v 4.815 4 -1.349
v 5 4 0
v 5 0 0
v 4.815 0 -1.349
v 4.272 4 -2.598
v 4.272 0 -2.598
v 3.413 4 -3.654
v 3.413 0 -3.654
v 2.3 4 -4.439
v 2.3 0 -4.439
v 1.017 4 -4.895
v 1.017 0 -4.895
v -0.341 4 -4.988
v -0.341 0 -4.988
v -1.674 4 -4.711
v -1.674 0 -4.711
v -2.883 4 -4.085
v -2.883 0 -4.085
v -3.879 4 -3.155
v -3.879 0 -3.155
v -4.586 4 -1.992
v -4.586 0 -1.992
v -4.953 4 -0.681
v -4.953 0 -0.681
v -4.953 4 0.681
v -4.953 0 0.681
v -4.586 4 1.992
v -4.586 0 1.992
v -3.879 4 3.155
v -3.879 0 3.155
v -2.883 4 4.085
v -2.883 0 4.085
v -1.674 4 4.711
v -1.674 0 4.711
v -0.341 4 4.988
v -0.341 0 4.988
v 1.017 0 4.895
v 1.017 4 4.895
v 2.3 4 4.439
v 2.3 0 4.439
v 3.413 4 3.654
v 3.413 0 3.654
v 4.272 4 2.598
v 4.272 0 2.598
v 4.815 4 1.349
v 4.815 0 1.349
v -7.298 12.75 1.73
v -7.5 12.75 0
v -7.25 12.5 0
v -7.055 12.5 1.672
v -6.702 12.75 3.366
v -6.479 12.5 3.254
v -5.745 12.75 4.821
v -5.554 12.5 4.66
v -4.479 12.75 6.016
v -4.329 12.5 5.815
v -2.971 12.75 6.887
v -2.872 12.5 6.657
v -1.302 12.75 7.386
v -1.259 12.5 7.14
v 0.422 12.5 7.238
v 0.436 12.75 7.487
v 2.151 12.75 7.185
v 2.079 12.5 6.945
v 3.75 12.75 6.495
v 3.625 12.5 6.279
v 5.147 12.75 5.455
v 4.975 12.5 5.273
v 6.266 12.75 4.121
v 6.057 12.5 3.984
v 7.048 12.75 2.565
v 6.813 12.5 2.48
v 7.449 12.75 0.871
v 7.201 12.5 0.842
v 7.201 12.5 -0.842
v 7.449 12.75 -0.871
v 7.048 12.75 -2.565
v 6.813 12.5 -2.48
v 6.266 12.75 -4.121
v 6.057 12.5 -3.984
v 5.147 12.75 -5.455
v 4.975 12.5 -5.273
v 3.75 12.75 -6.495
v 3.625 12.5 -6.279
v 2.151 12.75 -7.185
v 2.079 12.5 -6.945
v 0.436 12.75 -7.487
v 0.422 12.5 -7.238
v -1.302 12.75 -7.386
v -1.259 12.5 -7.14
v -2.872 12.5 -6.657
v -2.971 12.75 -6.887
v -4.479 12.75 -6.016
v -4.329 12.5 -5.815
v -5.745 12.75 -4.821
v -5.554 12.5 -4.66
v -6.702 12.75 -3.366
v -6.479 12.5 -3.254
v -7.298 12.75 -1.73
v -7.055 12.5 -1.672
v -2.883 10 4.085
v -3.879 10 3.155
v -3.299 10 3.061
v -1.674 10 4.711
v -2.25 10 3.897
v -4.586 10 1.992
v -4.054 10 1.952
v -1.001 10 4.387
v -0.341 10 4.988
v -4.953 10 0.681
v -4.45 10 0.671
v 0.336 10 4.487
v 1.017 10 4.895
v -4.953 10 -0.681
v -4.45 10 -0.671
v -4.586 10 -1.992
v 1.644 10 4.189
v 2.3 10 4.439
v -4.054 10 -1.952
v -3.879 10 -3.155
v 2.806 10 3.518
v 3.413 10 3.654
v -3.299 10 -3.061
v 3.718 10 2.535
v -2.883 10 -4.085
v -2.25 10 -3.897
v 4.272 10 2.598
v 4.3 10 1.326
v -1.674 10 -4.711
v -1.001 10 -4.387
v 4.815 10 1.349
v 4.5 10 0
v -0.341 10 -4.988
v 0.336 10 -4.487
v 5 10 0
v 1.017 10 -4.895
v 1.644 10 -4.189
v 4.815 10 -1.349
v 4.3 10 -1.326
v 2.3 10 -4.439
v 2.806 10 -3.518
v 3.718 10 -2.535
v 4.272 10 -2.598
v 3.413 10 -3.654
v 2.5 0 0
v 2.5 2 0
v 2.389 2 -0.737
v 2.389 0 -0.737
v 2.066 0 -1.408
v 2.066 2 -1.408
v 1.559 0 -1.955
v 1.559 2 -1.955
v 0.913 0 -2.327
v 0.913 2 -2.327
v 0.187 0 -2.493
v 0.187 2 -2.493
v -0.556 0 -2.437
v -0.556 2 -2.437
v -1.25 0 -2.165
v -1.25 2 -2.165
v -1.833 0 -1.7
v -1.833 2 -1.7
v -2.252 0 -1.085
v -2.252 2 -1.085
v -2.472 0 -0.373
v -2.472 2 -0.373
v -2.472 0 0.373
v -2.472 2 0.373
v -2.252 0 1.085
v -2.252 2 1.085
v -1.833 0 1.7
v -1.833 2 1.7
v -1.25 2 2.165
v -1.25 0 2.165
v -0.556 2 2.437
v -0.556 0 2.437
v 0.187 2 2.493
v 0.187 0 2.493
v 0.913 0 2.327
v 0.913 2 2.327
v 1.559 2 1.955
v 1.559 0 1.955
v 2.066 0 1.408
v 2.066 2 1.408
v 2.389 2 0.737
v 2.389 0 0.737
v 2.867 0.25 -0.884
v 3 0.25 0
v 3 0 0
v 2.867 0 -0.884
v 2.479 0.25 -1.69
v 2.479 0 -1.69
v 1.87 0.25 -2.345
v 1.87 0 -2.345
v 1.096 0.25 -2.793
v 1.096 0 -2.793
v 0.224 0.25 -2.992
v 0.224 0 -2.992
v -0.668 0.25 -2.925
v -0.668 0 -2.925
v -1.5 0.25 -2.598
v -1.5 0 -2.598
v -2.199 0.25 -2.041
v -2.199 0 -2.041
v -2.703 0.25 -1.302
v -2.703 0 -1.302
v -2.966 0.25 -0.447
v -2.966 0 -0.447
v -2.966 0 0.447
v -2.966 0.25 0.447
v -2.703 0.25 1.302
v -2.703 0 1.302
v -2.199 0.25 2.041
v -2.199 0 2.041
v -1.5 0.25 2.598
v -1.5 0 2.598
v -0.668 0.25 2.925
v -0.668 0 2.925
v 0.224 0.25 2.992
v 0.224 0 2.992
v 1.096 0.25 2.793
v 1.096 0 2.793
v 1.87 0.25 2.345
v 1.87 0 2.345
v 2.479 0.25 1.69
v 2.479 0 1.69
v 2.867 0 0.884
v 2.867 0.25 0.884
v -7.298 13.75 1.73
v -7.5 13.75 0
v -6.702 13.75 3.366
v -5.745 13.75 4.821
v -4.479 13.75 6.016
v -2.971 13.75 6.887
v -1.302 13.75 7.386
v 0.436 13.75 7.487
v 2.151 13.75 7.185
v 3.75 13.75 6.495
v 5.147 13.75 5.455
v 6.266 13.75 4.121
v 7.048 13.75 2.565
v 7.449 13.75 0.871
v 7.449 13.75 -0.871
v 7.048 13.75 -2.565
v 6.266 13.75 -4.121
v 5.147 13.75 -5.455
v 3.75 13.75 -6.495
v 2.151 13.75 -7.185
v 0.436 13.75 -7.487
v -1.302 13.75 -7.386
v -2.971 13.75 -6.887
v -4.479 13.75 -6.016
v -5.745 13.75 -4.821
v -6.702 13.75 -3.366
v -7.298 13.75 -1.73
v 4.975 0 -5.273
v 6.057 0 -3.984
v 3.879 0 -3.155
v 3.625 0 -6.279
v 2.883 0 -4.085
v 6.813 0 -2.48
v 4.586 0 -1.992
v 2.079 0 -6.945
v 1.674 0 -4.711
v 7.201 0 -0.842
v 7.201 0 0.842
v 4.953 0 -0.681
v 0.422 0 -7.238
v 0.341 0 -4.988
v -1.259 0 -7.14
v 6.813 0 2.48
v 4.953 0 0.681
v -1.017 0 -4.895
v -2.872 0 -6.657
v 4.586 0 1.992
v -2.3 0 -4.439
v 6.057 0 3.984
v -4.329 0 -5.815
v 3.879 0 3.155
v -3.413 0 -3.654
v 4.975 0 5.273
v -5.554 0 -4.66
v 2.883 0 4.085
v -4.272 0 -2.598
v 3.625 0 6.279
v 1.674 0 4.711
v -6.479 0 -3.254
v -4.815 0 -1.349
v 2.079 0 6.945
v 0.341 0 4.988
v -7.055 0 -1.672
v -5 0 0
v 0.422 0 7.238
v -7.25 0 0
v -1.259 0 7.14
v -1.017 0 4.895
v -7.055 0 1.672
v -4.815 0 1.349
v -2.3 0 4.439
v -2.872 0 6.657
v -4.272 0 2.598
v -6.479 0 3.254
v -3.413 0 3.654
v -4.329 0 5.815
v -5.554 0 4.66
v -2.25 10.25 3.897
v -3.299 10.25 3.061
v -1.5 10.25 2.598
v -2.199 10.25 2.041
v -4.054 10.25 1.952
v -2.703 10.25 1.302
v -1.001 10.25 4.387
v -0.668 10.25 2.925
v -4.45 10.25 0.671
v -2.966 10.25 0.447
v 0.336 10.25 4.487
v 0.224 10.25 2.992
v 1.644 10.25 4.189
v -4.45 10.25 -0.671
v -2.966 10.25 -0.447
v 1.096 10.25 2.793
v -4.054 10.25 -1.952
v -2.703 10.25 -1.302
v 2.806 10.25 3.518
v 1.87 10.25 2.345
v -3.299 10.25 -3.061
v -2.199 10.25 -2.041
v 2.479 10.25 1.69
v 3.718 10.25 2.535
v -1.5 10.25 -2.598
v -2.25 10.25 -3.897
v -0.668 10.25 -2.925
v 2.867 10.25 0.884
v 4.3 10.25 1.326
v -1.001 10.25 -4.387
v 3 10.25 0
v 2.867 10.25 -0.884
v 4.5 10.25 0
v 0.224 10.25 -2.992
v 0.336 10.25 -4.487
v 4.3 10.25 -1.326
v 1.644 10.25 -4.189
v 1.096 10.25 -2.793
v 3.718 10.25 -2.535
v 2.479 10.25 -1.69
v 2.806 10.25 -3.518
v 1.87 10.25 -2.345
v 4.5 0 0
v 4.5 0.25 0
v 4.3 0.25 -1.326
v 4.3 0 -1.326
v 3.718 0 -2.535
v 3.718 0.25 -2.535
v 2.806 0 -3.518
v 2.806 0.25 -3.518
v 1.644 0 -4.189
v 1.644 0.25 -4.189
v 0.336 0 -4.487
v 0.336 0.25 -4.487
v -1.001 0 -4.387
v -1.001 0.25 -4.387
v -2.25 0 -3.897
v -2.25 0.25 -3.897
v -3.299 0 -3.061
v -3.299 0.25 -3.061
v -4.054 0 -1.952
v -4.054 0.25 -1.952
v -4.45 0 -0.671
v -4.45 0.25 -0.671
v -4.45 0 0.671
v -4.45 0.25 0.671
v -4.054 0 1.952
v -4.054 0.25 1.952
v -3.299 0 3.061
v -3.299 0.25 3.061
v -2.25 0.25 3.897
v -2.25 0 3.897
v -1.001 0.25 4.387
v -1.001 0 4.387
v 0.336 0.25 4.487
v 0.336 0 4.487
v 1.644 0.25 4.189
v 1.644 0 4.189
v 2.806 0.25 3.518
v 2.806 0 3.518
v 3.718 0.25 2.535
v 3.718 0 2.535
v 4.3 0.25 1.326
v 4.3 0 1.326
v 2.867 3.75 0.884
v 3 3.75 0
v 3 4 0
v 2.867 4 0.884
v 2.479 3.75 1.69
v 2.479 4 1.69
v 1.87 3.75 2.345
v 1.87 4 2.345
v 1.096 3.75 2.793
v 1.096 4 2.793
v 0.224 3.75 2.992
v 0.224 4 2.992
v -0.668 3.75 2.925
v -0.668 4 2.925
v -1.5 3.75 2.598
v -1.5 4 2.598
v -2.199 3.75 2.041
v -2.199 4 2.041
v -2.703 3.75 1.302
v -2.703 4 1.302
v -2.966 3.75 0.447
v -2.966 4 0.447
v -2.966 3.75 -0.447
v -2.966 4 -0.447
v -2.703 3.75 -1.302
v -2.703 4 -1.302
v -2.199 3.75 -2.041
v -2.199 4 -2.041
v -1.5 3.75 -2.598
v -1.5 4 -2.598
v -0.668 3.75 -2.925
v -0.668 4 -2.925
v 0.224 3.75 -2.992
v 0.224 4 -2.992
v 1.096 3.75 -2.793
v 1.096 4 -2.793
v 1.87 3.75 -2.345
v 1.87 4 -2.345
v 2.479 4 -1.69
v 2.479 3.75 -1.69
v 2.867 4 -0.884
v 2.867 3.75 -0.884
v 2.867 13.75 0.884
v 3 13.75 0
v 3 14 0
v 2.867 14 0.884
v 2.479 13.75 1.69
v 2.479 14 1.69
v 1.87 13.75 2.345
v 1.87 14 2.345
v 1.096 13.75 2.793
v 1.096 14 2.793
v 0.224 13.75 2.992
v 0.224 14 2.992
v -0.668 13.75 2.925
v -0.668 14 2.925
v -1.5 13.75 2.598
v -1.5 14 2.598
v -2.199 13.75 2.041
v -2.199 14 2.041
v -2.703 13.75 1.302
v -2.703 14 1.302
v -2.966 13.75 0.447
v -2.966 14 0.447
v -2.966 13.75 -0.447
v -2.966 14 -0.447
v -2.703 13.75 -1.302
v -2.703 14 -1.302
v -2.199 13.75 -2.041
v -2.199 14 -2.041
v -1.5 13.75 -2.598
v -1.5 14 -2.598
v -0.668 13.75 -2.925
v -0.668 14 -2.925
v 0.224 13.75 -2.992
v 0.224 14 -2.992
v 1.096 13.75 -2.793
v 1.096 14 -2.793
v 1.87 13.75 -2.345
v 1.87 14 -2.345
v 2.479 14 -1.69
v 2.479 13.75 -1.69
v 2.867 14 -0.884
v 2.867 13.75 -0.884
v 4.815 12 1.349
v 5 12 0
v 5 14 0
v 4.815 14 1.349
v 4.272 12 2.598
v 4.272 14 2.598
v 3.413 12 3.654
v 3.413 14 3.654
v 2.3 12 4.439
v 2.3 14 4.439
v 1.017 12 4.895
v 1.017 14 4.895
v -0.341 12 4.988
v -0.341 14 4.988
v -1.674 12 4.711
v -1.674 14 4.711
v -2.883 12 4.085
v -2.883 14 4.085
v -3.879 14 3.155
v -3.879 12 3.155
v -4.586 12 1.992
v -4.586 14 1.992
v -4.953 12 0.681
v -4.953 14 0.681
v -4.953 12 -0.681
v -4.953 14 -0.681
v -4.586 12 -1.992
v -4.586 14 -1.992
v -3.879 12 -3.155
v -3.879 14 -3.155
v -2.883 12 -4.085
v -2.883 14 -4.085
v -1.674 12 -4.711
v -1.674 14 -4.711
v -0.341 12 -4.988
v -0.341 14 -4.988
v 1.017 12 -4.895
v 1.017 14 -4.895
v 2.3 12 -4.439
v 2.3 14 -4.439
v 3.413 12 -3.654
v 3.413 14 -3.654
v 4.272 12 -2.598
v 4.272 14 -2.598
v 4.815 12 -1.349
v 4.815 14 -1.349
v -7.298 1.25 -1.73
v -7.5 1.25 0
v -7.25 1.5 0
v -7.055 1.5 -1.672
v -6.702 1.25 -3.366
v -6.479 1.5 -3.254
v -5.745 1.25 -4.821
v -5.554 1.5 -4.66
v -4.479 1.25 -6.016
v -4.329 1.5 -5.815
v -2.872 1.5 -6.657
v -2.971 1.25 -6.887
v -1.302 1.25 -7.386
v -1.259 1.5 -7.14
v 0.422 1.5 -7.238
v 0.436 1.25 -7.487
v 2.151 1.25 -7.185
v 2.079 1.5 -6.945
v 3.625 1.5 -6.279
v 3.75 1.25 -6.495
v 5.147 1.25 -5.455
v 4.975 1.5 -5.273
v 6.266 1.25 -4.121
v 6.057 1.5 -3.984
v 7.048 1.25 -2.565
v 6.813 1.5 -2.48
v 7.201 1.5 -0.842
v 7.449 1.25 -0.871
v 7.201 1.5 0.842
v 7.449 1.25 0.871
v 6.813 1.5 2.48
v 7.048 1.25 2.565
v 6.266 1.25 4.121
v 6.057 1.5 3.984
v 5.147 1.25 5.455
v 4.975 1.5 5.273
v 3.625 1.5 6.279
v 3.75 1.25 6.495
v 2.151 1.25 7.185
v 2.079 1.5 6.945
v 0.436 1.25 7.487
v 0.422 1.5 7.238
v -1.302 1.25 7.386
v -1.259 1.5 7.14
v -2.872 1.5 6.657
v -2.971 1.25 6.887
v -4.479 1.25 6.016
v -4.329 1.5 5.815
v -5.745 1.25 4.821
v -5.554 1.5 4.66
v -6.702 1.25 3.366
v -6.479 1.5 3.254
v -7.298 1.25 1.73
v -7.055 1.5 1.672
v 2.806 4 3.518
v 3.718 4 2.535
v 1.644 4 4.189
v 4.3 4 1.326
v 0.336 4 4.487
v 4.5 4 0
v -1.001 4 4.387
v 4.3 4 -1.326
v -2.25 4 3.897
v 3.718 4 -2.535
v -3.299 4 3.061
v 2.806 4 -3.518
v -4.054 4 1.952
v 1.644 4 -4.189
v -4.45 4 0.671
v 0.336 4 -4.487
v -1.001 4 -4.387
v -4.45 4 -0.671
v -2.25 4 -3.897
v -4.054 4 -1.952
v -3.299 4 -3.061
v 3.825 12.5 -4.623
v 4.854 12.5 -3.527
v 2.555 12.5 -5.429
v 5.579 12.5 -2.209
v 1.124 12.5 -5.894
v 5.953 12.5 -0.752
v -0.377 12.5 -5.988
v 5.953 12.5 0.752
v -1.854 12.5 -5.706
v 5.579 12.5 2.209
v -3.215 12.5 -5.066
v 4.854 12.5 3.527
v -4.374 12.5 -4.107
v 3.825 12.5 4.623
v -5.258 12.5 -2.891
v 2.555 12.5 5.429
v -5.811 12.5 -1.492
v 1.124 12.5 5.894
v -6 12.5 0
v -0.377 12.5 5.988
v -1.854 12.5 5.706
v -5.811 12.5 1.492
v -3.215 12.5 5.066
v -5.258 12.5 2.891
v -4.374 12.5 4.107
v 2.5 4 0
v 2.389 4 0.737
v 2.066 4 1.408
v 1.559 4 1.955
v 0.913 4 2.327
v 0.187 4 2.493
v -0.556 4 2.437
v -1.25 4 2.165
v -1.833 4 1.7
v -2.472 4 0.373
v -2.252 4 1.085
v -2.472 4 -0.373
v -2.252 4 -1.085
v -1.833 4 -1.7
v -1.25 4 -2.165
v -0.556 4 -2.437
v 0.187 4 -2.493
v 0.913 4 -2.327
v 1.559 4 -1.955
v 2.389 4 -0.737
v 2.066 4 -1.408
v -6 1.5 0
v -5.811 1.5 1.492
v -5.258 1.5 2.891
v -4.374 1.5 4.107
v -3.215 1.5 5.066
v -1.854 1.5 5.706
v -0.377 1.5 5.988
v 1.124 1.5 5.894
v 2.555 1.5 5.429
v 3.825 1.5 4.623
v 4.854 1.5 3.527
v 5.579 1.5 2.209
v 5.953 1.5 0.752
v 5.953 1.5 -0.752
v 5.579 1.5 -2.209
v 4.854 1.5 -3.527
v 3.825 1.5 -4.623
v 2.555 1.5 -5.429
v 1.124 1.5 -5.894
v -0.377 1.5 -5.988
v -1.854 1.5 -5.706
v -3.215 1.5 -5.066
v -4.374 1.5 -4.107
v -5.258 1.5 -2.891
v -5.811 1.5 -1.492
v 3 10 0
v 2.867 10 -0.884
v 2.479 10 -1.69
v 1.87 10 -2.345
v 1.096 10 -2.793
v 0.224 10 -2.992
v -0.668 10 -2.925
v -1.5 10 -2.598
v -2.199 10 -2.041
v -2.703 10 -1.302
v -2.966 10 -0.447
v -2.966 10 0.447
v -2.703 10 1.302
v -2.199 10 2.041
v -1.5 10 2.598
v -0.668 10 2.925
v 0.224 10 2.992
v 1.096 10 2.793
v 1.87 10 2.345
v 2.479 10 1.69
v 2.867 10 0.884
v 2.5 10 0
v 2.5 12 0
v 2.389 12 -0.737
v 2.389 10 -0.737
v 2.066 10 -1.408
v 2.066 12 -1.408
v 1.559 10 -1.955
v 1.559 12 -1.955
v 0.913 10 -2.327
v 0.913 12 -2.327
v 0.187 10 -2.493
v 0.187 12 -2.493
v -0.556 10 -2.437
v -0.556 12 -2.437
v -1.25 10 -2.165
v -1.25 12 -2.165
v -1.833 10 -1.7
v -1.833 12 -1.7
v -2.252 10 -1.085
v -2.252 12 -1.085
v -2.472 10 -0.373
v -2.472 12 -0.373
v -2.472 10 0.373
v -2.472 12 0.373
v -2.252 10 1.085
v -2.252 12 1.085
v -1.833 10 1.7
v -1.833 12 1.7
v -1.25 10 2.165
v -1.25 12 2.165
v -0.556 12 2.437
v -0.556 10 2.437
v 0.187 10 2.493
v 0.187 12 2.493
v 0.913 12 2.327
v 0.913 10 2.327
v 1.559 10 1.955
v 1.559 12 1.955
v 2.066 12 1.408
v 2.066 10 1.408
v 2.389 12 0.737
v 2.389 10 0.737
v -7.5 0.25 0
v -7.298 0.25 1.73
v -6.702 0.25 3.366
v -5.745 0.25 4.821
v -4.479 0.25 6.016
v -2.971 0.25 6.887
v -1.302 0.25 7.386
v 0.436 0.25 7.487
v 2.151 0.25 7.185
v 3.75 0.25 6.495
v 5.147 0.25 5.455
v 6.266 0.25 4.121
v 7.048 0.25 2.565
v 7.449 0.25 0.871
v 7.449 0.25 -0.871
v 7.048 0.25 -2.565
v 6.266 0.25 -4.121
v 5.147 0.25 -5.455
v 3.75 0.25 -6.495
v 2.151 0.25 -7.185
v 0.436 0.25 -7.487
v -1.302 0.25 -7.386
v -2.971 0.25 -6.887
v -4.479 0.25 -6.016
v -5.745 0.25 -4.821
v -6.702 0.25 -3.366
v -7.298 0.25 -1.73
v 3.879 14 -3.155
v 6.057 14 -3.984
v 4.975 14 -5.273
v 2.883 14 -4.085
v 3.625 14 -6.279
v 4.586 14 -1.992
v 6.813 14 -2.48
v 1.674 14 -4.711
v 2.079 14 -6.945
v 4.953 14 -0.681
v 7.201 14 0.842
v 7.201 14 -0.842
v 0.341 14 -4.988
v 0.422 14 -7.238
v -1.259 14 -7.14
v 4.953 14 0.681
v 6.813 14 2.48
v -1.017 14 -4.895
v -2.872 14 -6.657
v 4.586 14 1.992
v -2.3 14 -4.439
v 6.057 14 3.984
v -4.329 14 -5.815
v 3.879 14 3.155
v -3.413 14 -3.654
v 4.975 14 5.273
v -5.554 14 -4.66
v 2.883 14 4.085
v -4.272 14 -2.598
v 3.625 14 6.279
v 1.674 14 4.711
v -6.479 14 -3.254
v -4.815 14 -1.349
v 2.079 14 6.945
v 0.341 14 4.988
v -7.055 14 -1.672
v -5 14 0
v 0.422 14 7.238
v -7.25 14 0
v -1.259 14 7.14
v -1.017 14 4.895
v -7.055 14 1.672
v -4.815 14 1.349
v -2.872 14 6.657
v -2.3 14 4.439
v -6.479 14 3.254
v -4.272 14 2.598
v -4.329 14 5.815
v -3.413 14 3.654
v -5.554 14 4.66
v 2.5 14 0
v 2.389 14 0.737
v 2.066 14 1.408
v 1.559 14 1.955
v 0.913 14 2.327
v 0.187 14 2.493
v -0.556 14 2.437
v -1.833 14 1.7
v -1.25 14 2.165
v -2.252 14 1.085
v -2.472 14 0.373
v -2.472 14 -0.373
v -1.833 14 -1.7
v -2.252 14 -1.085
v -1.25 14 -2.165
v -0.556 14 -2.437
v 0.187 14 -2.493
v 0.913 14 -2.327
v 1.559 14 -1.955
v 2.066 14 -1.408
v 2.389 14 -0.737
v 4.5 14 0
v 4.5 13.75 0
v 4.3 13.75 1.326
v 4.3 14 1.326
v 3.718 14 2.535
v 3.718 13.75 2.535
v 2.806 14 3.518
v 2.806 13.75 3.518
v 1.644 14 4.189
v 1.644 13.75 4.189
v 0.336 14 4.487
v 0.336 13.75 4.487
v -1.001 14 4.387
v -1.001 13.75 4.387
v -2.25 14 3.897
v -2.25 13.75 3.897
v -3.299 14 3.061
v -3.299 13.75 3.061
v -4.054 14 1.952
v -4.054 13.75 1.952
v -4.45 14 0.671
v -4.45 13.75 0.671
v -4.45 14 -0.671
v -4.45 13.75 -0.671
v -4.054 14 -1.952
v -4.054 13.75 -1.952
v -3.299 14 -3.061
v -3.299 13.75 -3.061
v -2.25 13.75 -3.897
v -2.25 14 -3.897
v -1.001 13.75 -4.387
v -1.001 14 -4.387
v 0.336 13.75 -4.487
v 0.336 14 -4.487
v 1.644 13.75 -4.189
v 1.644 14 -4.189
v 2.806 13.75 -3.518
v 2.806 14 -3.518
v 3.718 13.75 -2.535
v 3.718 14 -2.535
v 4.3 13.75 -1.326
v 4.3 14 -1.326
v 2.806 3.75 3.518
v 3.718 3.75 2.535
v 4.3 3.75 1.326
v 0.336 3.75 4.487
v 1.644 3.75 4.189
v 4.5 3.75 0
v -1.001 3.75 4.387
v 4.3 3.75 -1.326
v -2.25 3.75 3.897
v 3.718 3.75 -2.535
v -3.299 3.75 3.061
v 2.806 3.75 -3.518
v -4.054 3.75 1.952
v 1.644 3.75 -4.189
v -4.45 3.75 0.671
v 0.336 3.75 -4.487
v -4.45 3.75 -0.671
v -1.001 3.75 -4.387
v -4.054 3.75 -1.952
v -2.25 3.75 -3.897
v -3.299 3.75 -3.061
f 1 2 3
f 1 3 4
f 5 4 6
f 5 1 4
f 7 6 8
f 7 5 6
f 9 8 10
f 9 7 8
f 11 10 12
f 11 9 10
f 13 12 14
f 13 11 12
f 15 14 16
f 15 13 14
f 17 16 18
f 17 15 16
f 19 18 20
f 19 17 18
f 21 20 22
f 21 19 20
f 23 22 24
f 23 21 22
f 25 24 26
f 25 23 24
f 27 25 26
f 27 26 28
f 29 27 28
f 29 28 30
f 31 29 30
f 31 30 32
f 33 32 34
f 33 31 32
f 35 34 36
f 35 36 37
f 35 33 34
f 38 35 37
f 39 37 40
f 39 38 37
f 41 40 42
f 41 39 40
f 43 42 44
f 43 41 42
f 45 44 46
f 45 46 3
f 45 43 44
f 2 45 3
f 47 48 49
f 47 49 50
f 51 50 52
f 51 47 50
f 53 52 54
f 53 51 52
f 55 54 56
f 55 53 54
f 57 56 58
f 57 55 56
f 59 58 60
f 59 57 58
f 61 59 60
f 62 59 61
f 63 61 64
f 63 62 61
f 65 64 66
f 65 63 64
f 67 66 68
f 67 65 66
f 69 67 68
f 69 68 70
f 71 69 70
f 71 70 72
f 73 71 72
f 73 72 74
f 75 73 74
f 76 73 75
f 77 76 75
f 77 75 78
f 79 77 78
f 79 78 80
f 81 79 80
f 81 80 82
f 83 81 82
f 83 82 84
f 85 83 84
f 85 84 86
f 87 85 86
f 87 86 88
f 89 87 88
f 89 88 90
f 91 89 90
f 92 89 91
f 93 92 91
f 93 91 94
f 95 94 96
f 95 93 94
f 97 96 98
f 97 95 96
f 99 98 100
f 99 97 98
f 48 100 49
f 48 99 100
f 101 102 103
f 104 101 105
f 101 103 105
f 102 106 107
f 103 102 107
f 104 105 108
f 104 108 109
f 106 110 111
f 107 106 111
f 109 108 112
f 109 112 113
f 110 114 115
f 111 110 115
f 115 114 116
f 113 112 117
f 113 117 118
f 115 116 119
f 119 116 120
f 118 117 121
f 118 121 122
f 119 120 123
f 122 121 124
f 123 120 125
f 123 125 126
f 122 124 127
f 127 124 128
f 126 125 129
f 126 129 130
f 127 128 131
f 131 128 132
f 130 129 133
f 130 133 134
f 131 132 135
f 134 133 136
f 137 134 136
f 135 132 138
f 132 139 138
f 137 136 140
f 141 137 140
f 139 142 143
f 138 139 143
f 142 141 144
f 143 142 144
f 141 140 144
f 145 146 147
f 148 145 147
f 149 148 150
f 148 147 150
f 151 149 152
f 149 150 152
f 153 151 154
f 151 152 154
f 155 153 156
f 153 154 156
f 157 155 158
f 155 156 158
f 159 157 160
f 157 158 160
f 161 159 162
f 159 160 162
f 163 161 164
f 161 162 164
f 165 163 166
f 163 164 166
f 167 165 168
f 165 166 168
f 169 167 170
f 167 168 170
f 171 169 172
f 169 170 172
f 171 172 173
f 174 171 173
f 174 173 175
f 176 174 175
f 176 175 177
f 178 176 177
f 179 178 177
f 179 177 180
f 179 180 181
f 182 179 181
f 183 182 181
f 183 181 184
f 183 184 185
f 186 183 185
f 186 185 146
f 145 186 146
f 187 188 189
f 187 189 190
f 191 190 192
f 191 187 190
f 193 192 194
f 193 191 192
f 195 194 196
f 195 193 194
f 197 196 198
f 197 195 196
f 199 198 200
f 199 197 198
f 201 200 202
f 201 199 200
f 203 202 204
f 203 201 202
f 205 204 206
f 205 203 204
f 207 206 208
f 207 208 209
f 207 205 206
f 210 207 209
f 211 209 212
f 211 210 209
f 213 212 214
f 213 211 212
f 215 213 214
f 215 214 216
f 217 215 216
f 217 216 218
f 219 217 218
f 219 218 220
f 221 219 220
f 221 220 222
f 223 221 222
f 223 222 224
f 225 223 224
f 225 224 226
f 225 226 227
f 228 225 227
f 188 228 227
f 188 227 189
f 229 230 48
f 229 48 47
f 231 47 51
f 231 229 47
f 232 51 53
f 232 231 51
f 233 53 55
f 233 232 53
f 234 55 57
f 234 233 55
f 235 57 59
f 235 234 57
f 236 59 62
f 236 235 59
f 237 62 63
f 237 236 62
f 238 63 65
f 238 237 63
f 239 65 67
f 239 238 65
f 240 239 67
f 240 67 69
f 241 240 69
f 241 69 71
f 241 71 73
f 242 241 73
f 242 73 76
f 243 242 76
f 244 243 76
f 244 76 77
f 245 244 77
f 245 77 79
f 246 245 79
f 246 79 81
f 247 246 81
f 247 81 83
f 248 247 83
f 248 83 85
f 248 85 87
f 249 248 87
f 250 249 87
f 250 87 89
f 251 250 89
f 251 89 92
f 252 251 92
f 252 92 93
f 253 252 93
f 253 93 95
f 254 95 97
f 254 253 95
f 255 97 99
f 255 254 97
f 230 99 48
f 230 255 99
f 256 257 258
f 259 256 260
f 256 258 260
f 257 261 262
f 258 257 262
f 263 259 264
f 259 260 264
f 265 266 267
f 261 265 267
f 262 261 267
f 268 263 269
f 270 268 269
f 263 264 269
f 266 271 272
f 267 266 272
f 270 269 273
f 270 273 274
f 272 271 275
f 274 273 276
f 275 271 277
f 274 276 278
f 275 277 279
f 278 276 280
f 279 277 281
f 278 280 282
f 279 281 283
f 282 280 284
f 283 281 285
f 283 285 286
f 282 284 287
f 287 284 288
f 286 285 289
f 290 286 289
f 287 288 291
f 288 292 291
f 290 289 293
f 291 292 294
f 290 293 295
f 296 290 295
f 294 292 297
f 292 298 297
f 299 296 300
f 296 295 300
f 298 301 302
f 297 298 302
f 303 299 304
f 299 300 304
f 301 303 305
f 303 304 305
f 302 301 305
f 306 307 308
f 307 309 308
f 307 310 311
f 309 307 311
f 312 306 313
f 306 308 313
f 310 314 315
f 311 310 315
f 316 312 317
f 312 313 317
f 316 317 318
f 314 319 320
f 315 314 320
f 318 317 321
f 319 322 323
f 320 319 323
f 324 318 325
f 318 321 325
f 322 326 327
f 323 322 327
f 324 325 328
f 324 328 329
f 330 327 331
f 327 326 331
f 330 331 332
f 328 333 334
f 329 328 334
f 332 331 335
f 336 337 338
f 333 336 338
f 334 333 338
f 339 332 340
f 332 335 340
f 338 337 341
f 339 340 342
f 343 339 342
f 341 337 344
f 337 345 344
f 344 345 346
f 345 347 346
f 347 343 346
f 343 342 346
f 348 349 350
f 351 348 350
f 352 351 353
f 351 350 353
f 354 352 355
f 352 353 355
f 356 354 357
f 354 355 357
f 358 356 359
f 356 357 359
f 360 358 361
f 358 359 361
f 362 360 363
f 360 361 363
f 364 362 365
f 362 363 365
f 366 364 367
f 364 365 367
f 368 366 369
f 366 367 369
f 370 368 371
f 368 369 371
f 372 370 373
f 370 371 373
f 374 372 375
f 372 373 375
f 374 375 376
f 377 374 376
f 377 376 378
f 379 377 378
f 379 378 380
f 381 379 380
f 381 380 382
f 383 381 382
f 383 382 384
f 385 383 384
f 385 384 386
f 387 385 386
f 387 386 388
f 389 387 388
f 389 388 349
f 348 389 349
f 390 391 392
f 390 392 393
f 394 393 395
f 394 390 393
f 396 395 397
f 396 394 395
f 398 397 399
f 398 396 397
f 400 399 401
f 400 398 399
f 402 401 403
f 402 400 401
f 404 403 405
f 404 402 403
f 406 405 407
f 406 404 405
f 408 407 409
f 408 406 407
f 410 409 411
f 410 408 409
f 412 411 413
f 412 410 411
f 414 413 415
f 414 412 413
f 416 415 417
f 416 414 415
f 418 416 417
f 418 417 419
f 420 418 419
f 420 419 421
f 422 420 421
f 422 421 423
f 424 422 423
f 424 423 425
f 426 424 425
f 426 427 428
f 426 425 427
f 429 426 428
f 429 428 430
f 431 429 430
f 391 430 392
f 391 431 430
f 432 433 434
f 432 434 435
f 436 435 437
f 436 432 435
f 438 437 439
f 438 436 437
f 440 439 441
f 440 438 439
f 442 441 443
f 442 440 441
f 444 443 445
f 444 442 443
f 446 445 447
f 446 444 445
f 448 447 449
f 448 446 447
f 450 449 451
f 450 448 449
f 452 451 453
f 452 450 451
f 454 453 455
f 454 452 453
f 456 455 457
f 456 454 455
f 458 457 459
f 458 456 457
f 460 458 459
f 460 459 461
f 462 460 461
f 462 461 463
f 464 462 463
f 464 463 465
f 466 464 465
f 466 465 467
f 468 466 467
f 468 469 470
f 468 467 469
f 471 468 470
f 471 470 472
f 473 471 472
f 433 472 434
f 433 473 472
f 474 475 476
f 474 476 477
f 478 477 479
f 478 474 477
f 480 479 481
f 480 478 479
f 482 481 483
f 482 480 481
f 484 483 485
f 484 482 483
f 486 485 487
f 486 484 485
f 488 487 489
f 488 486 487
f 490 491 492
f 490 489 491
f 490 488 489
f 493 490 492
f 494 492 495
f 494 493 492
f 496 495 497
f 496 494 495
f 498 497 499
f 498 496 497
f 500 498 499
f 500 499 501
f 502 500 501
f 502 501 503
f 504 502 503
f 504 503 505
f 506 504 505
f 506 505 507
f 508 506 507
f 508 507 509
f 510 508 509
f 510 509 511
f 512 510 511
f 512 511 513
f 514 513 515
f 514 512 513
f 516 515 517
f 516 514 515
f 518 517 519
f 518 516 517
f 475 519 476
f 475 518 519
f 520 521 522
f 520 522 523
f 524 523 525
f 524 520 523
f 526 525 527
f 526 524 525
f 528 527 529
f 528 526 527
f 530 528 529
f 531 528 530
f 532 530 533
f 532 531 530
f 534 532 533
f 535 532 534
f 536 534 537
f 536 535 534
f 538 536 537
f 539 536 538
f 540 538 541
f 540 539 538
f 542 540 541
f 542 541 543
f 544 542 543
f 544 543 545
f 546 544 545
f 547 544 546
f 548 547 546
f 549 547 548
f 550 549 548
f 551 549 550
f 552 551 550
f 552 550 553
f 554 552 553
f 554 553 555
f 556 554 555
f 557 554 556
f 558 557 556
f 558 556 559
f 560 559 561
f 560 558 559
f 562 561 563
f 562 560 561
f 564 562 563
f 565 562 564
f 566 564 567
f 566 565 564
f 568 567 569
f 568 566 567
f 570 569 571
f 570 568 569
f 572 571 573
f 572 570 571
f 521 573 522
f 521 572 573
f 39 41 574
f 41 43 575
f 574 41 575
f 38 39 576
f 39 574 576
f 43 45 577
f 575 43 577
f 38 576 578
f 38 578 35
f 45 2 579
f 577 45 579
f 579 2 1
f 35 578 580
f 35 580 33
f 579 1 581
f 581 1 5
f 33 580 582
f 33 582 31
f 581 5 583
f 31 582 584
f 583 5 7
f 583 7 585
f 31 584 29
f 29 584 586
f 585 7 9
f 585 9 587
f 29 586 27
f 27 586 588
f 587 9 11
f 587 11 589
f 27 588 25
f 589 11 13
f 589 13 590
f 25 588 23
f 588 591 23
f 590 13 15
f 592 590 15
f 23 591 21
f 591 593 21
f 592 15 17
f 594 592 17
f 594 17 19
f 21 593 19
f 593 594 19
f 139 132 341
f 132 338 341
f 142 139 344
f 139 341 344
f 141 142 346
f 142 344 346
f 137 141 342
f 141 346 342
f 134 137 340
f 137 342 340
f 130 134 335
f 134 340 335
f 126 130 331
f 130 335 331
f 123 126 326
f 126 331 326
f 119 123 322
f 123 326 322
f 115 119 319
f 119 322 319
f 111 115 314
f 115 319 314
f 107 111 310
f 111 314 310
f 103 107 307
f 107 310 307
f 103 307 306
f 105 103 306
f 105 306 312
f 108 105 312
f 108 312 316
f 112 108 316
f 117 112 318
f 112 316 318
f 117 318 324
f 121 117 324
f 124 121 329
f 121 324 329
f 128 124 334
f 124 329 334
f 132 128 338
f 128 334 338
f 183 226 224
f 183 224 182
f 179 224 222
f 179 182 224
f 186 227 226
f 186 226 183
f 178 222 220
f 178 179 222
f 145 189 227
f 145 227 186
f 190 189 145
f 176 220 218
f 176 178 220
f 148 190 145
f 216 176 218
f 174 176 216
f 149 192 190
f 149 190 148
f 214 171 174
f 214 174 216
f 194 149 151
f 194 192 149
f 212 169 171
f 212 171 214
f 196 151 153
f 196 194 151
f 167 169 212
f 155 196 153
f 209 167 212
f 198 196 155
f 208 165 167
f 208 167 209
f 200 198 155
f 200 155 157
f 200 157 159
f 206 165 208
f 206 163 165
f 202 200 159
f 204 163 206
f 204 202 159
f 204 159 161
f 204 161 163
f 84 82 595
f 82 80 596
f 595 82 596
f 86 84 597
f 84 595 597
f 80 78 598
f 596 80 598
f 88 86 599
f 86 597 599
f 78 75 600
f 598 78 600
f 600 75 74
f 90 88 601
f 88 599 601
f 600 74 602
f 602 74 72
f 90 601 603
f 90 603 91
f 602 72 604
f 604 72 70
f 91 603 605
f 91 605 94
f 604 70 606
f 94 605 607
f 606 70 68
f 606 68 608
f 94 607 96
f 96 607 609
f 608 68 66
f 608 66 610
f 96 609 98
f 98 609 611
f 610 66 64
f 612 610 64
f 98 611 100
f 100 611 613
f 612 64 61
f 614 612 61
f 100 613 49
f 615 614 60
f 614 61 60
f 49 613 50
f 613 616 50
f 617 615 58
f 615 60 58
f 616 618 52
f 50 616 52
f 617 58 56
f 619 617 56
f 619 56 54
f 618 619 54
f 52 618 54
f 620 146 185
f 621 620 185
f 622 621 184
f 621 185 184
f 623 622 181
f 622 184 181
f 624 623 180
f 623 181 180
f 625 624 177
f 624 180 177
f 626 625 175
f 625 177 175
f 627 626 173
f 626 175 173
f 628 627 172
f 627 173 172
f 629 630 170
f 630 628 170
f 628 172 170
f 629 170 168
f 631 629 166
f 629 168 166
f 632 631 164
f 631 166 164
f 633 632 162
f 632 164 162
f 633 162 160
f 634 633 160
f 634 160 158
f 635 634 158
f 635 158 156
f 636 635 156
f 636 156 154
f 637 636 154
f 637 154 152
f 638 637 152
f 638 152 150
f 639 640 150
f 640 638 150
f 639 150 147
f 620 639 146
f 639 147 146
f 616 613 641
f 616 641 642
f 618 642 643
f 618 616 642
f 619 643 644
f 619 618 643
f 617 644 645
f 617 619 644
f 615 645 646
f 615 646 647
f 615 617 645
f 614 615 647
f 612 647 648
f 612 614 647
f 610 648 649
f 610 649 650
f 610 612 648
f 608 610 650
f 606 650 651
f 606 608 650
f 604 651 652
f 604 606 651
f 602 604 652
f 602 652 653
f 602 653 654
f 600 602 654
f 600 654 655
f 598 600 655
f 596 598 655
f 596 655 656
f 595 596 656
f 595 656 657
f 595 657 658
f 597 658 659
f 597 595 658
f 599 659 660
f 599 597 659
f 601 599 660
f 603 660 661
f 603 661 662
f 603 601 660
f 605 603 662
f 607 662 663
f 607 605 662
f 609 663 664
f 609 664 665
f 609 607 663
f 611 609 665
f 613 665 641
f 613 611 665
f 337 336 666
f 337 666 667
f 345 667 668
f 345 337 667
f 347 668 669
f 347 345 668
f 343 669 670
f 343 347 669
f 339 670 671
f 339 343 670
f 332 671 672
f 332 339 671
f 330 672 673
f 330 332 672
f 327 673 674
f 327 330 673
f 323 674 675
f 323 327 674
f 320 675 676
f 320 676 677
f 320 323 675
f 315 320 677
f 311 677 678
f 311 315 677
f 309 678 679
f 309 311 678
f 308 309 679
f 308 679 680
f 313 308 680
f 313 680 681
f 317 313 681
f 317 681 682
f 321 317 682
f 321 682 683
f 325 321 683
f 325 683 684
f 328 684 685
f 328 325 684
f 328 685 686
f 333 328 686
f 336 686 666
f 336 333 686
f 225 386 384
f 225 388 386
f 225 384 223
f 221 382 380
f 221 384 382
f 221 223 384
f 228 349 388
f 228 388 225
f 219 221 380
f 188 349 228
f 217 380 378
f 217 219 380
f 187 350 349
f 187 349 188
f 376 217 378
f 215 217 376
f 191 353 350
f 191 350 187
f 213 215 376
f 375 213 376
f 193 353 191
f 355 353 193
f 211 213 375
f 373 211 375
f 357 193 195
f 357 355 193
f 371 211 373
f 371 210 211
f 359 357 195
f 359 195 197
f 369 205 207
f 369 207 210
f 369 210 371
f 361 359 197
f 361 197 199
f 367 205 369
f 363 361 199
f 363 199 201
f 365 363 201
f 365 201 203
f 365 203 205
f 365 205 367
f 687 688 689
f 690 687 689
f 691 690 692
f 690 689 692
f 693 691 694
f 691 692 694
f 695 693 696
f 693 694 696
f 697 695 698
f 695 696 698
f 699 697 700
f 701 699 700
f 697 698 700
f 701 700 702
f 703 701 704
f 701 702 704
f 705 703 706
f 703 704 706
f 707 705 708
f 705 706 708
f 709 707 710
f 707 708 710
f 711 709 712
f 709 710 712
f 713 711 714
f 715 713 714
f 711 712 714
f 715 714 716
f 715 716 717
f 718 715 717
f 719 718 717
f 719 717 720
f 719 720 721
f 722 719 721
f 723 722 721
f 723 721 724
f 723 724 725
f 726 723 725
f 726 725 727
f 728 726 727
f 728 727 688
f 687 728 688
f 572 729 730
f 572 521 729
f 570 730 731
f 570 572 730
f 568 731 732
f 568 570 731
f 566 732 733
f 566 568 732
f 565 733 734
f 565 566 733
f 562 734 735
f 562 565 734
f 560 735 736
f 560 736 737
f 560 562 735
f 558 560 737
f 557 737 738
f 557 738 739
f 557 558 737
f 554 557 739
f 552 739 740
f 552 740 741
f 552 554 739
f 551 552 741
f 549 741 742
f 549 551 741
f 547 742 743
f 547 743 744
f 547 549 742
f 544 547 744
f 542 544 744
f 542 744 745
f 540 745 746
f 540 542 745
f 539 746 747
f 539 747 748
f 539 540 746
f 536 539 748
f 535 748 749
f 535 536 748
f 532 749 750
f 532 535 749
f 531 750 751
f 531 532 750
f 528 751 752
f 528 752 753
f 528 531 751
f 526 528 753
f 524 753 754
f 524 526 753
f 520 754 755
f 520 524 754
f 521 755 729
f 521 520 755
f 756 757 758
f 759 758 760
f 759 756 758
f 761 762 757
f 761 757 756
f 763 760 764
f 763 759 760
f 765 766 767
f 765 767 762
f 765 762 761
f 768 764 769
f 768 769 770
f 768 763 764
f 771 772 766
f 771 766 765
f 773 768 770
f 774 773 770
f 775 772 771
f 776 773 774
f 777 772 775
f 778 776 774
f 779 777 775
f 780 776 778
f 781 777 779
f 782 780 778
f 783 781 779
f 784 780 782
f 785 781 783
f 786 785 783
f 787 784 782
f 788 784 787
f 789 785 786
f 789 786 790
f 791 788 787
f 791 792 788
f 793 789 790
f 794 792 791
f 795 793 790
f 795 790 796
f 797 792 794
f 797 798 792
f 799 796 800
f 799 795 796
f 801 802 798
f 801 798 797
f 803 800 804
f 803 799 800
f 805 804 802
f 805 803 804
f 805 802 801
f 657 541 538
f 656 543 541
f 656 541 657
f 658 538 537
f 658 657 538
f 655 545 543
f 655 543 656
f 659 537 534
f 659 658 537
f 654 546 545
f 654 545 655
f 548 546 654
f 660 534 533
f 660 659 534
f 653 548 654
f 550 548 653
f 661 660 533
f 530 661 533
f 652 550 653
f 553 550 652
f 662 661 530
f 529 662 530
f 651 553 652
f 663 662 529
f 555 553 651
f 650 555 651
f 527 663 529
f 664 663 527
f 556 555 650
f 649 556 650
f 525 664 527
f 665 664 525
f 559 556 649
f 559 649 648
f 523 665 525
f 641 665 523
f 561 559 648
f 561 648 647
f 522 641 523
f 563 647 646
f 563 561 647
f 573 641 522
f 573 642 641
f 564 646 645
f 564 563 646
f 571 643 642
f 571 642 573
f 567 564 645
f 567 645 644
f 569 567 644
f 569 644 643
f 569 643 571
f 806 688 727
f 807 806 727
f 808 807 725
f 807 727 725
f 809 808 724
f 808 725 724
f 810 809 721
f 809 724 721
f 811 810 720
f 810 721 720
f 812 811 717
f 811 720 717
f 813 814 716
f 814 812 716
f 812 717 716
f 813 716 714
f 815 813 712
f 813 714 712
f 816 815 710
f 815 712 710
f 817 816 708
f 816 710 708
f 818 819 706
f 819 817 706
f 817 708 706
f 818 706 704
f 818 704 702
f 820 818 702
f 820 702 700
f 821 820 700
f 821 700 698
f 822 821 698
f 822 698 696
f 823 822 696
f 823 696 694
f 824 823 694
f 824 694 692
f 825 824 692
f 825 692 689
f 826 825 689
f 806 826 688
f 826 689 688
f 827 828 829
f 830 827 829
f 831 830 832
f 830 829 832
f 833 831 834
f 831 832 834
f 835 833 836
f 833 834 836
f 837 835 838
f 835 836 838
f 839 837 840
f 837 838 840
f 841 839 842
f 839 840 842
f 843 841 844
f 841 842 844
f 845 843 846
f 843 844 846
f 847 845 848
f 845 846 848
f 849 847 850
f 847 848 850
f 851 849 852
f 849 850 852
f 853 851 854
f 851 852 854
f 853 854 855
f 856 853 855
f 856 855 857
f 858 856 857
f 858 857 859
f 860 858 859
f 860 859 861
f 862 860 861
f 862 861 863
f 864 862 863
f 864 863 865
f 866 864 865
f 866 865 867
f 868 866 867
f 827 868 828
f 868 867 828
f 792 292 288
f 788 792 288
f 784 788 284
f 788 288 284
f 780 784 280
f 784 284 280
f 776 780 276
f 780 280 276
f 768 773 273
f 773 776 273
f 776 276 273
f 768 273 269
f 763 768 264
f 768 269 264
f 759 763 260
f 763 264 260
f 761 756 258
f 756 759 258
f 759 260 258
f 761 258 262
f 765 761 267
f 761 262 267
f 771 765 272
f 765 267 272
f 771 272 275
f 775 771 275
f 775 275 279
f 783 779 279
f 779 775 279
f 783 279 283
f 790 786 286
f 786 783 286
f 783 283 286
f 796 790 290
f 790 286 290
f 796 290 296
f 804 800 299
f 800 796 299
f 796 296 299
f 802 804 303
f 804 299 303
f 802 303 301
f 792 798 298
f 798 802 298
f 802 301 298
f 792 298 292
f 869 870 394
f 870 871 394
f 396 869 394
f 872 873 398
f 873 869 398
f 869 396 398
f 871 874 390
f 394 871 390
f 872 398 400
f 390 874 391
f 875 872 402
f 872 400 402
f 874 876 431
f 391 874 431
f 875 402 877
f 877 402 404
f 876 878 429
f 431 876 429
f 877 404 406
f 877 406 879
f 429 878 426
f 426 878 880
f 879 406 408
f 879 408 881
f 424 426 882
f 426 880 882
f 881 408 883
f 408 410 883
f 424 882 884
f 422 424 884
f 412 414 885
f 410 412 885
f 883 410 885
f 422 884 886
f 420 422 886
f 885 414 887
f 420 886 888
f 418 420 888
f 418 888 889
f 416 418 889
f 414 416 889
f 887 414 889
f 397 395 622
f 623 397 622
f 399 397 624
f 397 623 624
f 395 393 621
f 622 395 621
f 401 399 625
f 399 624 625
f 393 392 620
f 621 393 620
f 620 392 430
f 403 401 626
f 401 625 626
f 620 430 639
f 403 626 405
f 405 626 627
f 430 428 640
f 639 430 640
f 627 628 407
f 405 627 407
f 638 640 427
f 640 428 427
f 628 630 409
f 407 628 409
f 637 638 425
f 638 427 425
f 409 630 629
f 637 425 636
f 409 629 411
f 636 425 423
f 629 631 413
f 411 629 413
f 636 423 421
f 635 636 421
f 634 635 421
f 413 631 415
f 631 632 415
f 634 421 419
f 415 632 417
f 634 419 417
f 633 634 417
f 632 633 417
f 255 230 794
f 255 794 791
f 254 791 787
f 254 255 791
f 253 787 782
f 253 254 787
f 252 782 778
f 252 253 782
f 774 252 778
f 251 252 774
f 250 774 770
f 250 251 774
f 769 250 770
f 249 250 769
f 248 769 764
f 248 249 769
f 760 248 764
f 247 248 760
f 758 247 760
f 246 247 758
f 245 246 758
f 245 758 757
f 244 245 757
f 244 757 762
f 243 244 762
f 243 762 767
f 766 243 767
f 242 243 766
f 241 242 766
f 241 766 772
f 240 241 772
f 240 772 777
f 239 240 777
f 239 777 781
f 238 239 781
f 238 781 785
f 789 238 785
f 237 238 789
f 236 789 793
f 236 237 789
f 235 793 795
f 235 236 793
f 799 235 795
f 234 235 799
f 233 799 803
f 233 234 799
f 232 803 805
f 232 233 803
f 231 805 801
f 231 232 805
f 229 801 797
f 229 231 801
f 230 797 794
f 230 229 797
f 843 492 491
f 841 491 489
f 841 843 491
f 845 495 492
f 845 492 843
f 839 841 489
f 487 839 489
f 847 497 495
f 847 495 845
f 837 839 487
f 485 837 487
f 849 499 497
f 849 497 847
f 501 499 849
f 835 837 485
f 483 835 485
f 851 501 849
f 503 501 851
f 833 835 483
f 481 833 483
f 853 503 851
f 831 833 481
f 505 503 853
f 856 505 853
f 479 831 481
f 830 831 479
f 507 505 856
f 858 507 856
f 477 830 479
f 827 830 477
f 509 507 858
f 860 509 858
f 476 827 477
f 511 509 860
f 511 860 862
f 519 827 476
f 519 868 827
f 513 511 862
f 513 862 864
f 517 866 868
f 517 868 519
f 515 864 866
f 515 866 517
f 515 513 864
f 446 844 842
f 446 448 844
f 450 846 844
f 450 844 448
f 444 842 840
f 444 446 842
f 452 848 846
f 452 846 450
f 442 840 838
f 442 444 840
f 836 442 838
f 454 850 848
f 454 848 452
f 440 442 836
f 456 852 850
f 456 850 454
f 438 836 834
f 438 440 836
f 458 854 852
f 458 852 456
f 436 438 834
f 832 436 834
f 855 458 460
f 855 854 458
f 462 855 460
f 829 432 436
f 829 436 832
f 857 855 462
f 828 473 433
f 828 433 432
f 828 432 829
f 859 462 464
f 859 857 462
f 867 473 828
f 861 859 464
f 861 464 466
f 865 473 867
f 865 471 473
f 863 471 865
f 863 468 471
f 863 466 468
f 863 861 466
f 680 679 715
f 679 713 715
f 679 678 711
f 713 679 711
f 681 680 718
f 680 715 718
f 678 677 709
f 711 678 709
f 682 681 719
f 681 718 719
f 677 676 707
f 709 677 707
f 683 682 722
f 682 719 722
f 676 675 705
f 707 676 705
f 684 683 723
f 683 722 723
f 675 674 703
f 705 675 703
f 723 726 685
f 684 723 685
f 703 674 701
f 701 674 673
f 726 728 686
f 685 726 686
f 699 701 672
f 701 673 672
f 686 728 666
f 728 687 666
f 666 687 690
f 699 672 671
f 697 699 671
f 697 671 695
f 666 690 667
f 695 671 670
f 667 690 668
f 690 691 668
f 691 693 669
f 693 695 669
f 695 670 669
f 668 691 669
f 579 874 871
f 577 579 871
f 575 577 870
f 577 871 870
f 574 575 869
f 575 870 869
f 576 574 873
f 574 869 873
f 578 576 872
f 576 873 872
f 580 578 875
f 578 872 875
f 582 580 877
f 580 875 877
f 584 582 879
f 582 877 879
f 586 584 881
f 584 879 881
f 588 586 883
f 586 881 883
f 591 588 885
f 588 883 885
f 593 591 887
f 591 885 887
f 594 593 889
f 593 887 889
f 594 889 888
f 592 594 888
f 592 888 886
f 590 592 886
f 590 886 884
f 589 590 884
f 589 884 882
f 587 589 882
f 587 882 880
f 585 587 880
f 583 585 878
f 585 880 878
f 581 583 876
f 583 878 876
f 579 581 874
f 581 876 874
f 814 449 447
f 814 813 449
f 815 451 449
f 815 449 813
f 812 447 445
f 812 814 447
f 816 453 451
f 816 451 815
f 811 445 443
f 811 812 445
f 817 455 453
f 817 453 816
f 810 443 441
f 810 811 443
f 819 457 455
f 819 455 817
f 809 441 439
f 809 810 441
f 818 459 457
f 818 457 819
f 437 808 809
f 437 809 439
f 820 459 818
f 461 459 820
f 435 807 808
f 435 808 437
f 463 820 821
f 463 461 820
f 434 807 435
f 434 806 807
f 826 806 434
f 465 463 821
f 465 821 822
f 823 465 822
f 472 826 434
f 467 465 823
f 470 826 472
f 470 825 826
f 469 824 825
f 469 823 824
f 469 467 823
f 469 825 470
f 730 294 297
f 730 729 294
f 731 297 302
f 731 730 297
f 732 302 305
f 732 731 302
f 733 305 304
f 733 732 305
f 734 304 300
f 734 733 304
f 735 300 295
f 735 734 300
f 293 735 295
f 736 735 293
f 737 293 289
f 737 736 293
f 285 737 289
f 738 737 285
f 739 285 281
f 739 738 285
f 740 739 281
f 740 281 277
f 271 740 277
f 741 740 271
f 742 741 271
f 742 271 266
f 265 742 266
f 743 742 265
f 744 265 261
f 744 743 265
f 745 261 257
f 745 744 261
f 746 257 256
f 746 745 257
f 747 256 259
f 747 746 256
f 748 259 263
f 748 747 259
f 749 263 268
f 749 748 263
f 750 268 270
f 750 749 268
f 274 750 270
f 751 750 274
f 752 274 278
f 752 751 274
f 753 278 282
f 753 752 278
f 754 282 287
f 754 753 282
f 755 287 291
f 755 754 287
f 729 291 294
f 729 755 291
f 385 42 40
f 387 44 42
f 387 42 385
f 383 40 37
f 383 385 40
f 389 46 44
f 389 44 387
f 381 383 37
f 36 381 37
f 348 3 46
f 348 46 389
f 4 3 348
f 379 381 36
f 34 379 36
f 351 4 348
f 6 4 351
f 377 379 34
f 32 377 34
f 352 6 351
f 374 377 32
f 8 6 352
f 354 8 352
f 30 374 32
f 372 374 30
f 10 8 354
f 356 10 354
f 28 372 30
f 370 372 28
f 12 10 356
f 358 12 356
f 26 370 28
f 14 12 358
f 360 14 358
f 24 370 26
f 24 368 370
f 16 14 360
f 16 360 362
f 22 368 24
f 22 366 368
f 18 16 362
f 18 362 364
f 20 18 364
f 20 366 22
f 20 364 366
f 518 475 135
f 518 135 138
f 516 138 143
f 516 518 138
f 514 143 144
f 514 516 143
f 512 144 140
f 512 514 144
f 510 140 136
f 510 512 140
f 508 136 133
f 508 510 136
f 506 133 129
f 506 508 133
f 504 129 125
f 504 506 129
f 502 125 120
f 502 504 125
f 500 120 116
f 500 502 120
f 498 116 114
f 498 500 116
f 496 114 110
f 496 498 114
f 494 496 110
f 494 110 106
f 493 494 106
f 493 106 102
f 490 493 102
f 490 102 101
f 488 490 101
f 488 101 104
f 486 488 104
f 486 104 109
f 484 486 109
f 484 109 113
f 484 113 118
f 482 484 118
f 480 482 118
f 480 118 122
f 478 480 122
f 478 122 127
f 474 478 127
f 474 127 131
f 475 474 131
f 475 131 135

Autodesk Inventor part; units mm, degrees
ref_plane "YZ Plane" through (0, 0, 0) normal (1, 0, 0) x (0, 1, 0)
sketch "Sketch1" plane through (0, 0, 0) normal (0, 0, 1) x (1, 0, 0)
  line L0 (0, 0) -> (-7.5, 0)
  line L1 (-7.5, 0) -> (-7.5, 1.5)
  line L2 (-7.5, 1.5) -> (0, 1.5)
  line L3 (0, 1.5) -> (0, 0)
  line L4 (0, 1.5) -> (-6, 1.5)
  line L5 (-6, 1.5) -> (-6, 12.5)
  line L6 (-6, 12.5) -> (0, 12.5)
  line L7 (0, 12.5) -> (0, 1.5)
  line L8 (0, 12.5) -> (-7.5, 12.5)
  line L9 (-7.5, 12.5) -> (-7.5, 14)
  line L10 (-7.5, 14) -> (0, 14)
  line L11 (0, 14) -> (0, 12.5)
  line L12 (0, 14) -> (-5, 14)
  line L13 (-5, 14) -> (-5, 0)
  line L14 (-5, 0) -> (0, 0)
  line L15 (0, 0) -> (0, 14)
  point P0 (-5, 14)
  point P1 (-6, 1.5)
  dimension "d0" = 7.5
  dimension "d1" = 5
  dimension "d2" = 14
  dimension "d3" = 11
  dimension "d4" = 1.5
  dimension "d5" = 6
revolve "Revolution1" add sketch "Sketch1" angle 360 about axis through (0, 0, 0) along (0, 1, 0) contours L0 L1 L2 L13 | L2 L5 L6 L13 | L6 L8 L9 L10 L13
chamfer "Chamfer2" distance 0.25 angle 45 4 edges at (7.5, 12.5, 0) (7.5, 1.5, 0) (7.5, 0, 0) (7.5, 14, 0)
ref_plane "Work Plane5" through (0, 12, 0) normal (0, 1, 0) x (1, 0, 0)
sketch "Sketch6" plane through (0, 12, 0) normal (0, 1, 0) x (1, 0, 0)
  circle A0 centre (0, 0) radius 5
  circle A1 centre (0, 0) radius 2.5
  circle A2 centre (0, 0) radius 4.5
  circle A3 centre (0, 0) radius 3
  dimension "d36" = 10
  dimension "d37" = 5
  dimension "d38" = 0.5
  dimension "d39" = 0.5
extrude "Extrusion3" add sketch "Sketch6" along normal mid plane 4 separate body
extrude "Extrusion4" add sketch "Sketch6" along normal mid plane 3.5 contours A2 bodies 2
ref_plane "Work Plane4" through (0, 7, 0) normal (0, -1, 0) x (1, 0, 0)
mirror "Mirror3" about plane through (0, 7, 0) normal (0, -1, 0) bodies 2
properties part number "10mm 20T Smooth Idler Pulley 5mm Bore" material "Aluminum 6061"
